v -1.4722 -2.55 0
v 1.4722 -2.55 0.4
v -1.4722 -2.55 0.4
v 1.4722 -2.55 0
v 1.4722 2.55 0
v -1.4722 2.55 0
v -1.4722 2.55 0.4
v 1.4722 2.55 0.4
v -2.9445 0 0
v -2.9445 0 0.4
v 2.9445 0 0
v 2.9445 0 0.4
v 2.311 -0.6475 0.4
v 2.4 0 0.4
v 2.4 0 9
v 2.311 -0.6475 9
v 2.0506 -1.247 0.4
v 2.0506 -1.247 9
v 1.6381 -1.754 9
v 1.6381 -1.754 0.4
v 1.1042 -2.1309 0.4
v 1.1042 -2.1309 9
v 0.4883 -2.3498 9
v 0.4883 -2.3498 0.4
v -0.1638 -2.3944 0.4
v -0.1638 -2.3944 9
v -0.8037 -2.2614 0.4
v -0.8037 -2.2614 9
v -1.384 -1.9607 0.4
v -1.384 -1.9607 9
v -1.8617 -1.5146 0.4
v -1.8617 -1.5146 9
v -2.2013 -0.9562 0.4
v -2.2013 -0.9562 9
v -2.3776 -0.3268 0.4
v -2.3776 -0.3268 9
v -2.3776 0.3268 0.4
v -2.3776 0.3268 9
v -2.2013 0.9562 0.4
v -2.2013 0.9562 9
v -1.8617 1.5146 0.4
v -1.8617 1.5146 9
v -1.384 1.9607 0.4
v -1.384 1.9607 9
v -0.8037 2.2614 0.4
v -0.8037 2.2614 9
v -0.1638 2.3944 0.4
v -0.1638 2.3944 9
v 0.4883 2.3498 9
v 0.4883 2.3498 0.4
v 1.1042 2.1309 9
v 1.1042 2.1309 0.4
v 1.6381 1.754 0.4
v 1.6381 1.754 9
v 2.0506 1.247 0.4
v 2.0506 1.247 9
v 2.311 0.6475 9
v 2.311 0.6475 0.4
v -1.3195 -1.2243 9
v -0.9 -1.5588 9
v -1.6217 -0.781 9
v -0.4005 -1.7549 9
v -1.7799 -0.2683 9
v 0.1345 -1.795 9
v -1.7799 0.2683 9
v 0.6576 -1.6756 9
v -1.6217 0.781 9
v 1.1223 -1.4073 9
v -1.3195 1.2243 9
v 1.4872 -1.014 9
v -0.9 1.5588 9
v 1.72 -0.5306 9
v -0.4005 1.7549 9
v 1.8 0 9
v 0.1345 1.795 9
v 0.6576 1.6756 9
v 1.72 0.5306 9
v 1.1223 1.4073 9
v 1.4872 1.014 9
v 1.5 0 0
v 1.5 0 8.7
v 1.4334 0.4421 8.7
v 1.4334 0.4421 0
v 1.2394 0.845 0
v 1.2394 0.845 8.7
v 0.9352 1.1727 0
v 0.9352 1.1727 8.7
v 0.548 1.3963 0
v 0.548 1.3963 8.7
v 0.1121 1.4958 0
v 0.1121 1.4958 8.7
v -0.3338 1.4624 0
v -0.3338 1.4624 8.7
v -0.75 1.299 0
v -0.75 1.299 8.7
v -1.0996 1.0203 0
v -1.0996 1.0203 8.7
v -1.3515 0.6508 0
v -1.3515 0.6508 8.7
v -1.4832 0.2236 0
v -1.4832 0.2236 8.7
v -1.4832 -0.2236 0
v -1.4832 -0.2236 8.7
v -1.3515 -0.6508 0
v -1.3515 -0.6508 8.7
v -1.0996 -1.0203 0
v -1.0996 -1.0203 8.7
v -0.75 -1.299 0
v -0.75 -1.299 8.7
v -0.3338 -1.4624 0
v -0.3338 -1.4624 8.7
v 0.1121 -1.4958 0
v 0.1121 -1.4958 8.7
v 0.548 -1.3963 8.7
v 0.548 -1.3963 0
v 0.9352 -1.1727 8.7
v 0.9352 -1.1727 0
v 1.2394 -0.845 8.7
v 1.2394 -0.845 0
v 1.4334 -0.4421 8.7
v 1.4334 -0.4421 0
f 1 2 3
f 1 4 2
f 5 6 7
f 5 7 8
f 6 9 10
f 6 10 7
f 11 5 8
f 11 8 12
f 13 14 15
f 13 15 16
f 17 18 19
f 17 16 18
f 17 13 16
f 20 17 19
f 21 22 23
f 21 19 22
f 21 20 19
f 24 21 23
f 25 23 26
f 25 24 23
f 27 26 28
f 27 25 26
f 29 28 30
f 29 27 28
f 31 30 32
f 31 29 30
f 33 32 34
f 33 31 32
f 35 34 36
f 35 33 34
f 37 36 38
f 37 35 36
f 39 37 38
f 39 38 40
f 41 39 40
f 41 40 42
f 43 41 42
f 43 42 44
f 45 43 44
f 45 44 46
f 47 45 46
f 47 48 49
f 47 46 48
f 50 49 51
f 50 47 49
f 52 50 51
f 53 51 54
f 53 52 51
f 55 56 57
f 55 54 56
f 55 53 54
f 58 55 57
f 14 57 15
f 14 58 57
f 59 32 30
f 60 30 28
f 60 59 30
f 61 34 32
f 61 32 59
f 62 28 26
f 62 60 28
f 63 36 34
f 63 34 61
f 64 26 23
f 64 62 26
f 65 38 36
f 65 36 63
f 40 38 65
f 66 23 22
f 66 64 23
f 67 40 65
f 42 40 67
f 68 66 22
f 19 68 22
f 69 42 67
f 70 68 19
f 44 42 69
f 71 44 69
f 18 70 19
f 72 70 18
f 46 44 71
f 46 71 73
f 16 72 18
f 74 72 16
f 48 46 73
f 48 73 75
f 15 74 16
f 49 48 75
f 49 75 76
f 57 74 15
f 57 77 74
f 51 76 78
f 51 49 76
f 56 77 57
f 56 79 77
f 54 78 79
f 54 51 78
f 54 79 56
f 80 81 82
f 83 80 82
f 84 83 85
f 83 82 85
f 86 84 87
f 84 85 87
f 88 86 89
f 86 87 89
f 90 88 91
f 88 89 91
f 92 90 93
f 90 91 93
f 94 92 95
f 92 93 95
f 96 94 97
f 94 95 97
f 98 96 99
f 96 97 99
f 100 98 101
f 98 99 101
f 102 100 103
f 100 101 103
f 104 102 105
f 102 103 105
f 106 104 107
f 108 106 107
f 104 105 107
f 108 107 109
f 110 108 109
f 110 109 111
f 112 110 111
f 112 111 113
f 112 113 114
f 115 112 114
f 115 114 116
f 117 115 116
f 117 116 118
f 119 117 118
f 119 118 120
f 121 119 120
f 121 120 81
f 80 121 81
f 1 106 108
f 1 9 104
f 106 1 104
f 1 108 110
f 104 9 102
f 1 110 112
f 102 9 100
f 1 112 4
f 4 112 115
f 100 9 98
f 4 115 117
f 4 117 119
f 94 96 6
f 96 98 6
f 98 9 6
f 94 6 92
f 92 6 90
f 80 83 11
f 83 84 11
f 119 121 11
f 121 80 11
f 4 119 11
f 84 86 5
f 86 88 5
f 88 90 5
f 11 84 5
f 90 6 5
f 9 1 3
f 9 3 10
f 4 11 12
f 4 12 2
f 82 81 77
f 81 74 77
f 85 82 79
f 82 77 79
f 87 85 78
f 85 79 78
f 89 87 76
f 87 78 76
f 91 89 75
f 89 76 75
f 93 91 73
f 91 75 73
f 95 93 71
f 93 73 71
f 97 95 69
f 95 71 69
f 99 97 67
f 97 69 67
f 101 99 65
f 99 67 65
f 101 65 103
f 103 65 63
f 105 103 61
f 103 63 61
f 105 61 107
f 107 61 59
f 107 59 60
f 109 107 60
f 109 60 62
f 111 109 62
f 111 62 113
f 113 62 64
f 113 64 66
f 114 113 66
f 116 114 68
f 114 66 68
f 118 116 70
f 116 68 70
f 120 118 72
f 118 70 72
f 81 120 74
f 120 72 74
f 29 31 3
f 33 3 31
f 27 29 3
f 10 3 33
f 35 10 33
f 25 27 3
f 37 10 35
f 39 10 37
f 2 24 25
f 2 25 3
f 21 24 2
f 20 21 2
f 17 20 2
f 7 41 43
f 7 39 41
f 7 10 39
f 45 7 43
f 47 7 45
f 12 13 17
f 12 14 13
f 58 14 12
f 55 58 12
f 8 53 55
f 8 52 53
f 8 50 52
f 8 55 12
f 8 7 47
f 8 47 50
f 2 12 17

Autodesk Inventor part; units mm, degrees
ref_plane "YZ Plane" through (0, 0, 0) normal (1, 0, 0) x (0, 1, 0)
ref_plane "XZ Plane" through (0, 0, 0) normal (0, 1, 0) x (-1, 0, 0)
ref_plane "XY Plane" through (0, 0, 0) normal (0, 0, 1) x (1, 0, 0)
sketch "Sketch1" plane through (0, 0, 0) normal (0, 0, 1) x (1, 0, 0)
  line L0 (1.4722, 2.55) -> (2.9445, 0)
  line L1 (2.9445, 0) -> (1.4722, -2.55)
  line L2 (1.4722, -2.55) -> (-1.4722, -2.55)
  line L3 (-1.4722, -2.55) -> (-2.9445, 0)
  line L4 (-2.9445, 0) -> (-1.4722, 2.55)
  line L5 (-1.4722, 2.55) -> (1.4722, 2.55)
  point P0 (0, 0)
  dimension "d0" = 5.1
extrude "Extrusion1" add sketch "Sketch1" along normal blind 0.4
sketch "Sketch2" plane through (0, 0, 0.4) normal (0, 0, 1) x (1, 0, 0)
  circle A0 centre (0, 0) radius 2.4
  dimension "d3" = 4.8
extrude "Extrusion2" add sketch "Sketch2" along normal blind 8.6
sketch "Sketch3" plane through (0, 0, 9) normal (0, 0, 1) x (1, 0, 0)
  circle A0 centre (0, 0) radius 2.4 projected
  circle A1 centre (0, 0) radius 1.5
  dimension "d6" = 3
extrude "Extrusion3" cut sketch "Sketch3" against normal blind 10 contours A1
chamfer "Chamfer1" distance 0.3 angle 45 1 edges at (-1.5, 0, 9)
thread "Thread1" size "M3x0.5" class "6H" standard "ANSI Metric M Profile" full length
properties part number "Вытяжная заклепка_Р-Ш-М3-Ум" material "Сталь низкоуглеродистая"
